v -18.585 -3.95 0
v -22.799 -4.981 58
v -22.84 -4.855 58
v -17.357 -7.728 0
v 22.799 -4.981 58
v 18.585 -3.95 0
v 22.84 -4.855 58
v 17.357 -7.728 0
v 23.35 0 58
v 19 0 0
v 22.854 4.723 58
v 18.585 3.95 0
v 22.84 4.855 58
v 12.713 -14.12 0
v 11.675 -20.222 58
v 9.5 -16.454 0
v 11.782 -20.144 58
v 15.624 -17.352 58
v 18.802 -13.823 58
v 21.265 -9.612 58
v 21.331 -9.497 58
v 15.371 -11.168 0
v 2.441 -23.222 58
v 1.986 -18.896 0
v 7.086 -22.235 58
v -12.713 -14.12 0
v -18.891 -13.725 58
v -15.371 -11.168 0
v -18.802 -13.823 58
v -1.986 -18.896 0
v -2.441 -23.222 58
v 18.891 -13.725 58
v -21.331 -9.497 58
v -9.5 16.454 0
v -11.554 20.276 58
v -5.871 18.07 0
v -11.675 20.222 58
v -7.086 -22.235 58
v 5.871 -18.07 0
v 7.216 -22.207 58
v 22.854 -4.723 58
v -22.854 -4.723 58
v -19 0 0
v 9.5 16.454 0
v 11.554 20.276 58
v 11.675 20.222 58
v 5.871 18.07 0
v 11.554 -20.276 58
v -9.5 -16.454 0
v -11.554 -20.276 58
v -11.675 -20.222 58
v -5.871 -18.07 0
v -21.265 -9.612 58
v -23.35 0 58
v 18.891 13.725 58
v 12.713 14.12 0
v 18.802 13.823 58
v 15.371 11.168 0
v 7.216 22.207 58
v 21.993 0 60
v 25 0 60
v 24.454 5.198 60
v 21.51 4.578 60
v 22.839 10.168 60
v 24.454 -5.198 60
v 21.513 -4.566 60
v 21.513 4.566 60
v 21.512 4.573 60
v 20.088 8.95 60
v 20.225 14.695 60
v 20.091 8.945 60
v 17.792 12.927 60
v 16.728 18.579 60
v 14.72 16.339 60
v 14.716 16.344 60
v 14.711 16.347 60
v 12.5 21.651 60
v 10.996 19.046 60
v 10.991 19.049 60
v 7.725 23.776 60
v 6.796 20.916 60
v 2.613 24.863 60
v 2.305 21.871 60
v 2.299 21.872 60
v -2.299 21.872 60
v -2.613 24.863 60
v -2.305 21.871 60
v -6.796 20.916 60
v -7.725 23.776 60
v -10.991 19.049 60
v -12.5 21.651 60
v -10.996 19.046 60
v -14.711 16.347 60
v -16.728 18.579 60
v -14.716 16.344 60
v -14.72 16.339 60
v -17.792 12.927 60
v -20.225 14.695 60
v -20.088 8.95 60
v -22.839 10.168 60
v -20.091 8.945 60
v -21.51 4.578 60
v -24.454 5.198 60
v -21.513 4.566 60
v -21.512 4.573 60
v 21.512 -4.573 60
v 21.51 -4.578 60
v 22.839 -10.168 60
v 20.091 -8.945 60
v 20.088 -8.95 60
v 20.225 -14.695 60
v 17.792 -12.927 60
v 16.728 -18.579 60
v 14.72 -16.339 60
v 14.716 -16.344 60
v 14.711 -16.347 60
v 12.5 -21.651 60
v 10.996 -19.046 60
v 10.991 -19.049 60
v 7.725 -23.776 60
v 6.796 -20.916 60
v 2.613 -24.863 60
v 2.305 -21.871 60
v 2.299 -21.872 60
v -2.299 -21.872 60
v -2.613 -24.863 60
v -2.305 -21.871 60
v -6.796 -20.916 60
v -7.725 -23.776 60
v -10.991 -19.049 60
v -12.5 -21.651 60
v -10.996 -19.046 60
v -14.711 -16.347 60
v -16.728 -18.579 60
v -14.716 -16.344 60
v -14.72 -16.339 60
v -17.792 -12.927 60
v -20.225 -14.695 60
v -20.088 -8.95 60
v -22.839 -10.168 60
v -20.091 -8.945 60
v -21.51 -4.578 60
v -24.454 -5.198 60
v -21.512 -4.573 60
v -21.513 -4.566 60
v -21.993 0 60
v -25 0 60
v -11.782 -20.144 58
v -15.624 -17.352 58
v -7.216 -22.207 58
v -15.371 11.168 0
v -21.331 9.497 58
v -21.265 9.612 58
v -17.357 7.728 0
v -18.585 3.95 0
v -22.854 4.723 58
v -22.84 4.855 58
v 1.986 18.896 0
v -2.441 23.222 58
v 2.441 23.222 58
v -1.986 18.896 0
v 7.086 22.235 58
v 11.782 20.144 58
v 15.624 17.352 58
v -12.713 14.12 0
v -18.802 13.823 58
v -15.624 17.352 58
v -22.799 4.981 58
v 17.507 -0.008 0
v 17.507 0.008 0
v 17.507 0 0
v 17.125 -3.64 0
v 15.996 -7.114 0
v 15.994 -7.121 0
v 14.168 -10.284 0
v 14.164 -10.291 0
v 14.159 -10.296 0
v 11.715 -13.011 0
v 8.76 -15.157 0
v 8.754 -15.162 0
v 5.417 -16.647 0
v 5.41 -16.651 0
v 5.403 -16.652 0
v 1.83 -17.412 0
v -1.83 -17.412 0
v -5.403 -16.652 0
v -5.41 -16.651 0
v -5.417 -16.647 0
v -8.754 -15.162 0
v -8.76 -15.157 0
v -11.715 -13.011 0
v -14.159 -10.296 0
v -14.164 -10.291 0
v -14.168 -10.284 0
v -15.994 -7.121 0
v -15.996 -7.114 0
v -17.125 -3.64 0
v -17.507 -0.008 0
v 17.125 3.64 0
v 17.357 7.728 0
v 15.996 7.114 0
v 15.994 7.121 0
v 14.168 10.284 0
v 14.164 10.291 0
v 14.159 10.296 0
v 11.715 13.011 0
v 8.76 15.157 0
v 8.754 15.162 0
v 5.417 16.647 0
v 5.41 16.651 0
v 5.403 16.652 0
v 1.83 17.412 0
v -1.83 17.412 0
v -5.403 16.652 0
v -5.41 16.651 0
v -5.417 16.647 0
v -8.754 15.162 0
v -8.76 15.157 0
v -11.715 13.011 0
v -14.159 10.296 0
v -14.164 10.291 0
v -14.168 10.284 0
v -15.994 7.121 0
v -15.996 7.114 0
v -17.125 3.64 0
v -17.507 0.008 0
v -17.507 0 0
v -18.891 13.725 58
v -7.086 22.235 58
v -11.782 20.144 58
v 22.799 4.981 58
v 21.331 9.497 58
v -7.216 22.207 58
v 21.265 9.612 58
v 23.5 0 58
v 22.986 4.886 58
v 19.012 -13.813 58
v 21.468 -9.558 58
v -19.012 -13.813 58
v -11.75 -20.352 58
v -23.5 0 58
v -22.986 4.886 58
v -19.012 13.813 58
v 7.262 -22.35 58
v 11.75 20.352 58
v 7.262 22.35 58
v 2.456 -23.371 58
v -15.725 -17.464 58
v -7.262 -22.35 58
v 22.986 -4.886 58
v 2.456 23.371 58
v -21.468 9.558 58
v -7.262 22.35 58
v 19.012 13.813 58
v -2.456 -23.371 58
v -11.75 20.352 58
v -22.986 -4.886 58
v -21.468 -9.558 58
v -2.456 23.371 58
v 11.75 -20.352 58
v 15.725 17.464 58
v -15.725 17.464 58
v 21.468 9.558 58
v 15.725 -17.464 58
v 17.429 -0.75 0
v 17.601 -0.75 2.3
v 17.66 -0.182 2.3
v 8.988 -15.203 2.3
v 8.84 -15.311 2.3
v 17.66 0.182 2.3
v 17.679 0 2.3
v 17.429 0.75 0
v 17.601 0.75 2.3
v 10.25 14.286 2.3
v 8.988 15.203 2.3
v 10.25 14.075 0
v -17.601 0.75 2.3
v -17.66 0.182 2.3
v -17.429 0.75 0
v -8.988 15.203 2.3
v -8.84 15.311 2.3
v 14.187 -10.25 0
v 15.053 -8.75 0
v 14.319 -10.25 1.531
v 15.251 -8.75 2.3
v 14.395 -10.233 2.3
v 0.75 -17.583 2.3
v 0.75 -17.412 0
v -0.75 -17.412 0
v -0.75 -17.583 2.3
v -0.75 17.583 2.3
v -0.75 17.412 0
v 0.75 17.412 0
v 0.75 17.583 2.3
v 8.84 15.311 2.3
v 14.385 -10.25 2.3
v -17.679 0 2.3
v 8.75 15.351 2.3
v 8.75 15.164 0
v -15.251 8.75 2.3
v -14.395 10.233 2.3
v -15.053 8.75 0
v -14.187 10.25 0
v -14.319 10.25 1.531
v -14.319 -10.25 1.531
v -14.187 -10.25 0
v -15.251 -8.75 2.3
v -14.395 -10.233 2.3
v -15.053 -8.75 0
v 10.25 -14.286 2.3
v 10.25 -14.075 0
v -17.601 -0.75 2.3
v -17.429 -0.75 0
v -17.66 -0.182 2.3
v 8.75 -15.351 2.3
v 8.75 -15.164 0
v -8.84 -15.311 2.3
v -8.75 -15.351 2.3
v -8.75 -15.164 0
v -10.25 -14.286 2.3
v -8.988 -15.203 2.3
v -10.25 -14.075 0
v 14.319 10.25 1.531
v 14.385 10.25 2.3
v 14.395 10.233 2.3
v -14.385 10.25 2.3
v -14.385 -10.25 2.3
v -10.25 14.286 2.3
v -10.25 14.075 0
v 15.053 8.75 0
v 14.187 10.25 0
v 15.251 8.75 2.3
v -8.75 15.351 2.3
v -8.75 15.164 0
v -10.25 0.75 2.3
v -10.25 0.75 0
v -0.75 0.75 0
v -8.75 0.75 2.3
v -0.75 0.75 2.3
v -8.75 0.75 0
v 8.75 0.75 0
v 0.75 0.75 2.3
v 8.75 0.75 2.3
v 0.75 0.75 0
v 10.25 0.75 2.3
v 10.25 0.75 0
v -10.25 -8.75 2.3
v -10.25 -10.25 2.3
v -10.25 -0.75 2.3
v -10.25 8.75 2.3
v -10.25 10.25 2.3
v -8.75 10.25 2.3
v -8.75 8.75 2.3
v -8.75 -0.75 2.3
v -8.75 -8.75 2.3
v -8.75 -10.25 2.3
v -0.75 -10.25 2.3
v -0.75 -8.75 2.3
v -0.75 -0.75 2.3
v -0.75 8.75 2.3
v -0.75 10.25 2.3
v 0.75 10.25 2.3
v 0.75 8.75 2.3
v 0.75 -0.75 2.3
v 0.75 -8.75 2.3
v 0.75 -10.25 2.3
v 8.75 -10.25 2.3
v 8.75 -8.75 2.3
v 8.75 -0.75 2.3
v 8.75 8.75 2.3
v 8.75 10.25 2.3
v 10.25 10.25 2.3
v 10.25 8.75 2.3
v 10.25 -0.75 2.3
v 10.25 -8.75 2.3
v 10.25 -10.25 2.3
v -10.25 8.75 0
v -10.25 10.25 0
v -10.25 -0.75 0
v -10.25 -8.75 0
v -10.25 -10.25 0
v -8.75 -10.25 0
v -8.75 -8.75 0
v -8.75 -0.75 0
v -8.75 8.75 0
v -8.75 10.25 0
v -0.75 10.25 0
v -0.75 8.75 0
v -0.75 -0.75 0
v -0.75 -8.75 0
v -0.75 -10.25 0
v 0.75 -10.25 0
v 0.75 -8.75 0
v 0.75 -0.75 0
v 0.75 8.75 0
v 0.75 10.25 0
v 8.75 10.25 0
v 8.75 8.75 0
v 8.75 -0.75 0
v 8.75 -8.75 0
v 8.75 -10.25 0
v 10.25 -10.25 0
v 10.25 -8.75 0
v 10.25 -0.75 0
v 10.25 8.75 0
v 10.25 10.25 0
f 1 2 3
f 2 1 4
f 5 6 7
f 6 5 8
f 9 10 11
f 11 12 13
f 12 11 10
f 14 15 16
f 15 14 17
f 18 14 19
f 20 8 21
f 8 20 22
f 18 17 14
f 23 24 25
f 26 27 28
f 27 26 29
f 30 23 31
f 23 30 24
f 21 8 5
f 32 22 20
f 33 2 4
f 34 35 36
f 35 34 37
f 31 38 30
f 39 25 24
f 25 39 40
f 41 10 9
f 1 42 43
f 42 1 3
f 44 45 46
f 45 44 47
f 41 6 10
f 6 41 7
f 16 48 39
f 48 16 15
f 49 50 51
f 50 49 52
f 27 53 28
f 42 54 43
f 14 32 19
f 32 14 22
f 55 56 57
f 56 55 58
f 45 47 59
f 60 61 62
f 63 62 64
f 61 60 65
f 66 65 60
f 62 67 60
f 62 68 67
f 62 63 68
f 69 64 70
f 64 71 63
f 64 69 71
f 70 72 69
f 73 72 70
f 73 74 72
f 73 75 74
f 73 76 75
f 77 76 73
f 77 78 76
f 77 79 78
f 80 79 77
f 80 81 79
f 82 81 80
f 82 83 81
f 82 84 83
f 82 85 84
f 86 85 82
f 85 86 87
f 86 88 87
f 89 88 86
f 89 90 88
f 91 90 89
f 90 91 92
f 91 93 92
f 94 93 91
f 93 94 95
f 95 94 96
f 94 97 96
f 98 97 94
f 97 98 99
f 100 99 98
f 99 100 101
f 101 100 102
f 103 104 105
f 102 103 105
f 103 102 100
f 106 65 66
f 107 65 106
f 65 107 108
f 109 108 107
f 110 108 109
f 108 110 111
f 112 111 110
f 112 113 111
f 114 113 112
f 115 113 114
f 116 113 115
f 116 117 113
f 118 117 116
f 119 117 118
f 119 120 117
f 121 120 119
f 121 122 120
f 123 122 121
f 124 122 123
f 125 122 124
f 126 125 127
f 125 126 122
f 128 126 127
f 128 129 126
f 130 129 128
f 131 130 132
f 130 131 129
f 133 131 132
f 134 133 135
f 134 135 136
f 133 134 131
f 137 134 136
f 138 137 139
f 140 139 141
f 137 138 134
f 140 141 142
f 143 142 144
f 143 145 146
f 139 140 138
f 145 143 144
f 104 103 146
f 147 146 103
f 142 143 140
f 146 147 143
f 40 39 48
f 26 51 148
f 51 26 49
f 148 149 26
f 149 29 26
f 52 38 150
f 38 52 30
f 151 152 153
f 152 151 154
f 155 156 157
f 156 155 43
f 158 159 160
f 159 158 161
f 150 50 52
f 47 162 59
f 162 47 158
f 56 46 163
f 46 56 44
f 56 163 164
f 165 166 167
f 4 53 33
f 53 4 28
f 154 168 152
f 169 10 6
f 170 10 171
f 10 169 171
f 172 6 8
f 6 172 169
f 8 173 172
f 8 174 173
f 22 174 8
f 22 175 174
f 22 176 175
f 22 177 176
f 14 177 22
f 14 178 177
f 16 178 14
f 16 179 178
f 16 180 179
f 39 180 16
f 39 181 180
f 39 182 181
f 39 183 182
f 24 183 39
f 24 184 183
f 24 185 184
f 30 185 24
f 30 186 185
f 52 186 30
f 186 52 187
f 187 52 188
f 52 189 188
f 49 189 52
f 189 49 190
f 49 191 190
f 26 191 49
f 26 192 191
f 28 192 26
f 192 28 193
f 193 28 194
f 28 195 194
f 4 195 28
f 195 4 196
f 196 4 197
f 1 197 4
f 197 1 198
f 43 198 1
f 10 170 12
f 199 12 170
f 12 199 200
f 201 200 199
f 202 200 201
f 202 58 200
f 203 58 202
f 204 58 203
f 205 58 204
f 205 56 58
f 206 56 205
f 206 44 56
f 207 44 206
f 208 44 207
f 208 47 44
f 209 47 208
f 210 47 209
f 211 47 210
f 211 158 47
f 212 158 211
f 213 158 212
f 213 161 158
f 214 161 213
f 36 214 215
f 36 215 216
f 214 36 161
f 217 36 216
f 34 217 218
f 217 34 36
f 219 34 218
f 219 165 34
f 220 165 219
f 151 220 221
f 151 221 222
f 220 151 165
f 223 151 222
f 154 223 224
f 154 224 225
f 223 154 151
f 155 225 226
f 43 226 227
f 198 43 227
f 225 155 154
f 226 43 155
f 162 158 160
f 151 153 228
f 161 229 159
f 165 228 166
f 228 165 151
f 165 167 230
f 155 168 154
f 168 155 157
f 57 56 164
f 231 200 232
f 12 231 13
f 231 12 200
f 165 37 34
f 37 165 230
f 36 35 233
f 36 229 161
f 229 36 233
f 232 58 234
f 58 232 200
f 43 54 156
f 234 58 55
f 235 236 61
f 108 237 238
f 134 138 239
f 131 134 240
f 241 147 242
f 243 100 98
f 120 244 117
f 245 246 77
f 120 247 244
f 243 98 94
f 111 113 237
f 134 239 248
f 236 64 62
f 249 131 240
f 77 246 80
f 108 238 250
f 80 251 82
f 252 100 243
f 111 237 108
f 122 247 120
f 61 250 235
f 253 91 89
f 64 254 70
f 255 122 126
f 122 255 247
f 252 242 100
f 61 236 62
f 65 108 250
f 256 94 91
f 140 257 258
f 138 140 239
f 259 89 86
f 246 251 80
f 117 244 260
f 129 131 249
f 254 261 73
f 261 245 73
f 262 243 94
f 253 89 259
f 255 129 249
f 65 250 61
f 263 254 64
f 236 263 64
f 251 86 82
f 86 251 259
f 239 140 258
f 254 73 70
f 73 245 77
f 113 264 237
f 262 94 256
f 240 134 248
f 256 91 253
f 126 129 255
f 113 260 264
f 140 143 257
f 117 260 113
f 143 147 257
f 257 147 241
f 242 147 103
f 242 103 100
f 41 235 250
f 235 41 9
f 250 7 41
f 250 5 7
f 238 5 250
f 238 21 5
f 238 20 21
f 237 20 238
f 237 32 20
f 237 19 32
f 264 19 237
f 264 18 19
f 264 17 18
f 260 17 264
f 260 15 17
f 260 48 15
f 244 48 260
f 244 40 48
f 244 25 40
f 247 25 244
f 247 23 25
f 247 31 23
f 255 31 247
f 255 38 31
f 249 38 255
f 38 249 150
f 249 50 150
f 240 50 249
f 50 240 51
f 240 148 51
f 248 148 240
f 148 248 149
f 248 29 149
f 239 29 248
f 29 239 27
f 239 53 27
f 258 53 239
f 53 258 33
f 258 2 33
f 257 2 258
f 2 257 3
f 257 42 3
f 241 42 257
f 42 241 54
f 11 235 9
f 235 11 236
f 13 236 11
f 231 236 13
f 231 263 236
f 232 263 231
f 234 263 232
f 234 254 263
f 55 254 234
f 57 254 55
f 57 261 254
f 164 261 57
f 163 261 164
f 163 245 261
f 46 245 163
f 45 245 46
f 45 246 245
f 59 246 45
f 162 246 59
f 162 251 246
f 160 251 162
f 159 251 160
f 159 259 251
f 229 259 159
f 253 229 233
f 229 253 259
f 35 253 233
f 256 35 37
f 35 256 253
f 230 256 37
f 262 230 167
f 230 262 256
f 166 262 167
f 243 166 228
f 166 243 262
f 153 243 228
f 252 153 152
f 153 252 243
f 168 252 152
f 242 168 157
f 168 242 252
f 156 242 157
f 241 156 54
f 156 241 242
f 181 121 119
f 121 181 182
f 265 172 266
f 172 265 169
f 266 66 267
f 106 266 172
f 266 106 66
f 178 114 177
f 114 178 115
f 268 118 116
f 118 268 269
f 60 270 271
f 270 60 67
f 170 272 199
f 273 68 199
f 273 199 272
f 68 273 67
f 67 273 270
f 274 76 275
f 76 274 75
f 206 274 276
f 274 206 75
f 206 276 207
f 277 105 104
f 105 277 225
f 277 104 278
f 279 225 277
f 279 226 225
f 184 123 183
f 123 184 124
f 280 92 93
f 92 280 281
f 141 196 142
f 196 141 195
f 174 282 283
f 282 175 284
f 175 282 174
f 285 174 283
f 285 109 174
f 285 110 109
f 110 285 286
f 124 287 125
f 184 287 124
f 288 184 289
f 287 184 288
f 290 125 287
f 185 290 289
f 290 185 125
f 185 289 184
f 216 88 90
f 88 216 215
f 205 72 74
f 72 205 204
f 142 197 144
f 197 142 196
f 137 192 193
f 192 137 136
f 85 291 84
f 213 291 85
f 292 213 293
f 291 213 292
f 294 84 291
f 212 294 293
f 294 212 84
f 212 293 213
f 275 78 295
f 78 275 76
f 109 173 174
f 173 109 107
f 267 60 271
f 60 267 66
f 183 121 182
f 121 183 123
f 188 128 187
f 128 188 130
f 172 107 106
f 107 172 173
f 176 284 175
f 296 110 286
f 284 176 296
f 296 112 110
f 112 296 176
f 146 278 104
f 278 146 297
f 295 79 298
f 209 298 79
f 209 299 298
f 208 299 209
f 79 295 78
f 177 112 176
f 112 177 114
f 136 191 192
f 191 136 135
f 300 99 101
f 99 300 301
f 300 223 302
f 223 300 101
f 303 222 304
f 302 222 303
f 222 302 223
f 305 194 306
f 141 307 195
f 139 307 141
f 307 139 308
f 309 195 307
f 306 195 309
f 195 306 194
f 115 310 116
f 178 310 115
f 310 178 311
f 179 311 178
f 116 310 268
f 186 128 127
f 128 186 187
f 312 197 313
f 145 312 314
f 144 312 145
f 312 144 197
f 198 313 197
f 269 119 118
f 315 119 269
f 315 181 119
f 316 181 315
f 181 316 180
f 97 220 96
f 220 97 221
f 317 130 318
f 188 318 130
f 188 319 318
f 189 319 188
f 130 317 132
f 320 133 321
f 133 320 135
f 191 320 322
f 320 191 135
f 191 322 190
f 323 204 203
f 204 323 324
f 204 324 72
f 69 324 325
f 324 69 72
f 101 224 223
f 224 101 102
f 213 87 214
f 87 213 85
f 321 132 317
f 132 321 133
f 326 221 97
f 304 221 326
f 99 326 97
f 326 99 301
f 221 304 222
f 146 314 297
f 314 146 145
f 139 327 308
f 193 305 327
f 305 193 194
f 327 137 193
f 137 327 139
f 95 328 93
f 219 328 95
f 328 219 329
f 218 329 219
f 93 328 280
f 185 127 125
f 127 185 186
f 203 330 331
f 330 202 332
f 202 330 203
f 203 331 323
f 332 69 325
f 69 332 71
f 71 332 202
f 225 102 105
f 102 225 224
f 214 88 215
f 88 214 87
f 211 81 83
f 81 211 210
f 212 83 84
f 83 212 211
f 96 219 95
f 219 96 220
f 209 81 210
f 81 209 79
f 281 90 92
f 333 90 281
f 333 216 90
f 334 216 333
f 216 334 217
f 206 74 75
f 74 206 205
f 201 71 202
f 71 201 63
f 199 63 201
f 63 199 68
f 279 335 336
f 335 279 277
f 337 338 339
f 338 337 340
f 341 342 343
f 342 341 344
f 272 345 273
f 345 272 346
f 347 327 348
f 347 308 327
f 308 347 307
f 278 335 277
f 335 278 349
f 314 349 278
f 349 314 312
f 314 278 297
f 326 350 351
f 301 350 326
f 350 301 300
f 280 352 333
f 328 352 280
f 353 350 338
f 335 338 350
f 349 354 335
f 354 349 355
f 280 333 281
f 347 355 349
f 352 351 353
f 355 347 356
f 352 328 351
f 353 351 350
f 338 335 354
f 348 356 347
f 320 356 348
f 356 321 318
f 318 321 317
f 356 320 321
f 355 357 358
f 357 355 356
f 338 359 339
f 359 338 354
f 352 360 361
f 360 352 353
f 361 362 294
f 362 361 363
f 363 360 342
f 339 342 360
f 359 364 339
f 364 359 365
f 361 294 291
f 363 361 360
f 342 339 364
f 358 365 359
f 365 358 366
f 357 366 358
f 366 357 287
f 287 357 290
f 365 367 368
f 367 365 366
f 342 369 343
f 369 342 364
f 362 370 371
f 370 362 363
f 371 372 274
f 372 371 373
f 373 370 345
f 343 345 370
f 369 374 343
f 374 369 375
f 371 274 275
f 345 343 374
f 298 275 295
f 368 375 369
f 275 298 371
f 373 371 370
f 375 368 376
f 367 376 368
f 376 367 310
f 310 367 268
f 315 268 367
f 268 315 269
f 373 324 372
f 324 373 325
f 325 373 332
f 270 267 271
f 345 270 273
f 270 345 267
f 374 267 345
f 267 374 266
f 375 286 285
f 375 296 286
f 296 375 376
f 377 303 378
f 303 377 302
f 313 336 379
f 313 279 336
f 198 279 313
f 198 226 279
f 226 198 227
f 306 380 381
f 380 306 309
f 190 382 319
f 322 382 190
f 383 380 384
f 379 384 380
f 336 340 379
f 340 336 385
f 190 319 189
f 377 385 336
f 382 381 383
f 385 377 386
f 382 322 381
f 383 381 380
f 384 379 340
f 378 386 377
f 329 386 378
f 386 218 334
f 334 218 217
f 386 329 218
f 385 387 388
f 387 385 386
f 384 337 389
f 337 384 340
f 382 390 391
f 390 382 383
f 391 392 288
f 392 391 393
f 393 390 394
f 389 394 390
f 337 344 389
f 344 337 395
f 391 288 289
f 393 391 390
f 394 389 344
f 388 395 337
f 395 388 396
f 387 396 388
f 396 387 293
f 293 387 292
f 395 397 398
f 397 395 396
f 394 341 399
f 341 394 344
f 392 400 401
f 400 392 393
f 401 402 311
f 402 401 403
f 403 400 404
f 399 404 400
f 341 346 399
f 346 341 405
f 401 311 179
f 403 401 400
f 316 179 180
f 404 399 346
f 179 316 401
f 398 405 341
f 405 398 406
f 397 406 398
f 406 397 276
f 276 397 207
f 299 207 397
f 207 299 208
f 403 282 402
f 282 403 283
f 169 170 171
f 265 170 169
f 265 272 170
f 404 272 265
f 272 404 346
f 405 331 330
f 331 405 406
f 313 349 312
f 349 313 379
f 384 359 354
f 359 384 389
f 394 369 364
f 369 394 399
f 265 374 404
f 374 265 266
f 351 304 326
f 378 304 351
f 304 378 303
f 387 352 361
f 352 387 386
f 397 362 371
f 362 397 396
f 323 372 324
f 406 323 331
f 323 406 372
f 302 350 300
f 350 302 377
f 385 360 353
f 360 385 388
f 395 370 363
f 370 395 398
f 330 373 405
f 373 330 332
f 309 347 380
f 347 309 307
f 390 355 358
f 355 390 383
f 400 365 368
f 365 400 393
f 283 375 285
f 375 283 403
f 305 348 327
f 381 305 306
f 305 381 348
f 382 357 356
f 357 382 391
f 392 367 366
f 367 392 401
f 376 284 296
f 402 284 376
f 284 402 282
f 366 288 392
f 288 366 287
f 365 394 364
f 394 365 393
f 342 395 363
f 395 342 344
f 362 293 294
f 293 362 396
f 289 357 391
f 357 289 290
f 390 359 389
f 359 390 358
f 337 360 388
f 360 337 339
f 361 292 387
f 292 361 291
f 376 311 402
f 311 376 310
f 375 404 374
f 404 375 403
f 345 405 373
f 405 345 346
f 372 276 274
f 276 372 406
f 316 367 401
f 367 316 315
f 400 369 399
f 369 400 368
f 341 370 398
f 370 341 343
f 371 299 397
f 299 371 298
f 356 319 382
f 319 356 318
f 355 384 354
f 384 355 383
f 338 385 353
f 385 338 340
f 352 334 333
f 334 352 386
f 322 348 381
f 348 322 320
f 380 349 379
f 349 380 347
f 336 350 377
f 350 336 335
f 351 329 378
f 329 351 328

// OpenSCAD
// Parametric hydroponic cup (C)2012 vik@diamondage.co.nz

cup_top_rad=47/2;
cup_wall=1.5;
cup_bottom_rad=38/2;
cup_height=60;
grid_ht=2.3;

difference () {
	union () {
		cylinder(h=cup_height,r1=cup_bottom_rad,r2=cup_top_rad);
		// Rim
		translate([0,0,cup_height-2]) cylinder(h=2,r2=cup_top_rad+cup_wall,r1=cup_top_rad);
	}
	translate([0,0,-0.1])
		cylinder(h=cup_height+0.2,r1=cup_bottom_rad-cup_wall,r2=cup_top_rad-cup_wall);
}

//grid for base.
translate([0,0,grid_ht/2]) intersection () {
	union () {
		cube([cup_wall,cup_bottom_rad*2,grid_ht],center=true);
		translate ([cup_bottom_rad*.5,0,0]) cube([cup_wall,cup_bottom_rad*2,grid_ht],center=true);
		translate ([cup_bottom_rad*-.5,0,0]) cube([cup_wall,cup_bottom_rad*2,grid_ht],center=true);
		
		rotate ([0,0,90]) {cube([cup_wall,cup_bottom_rad*2,grid_ht],center=true);
		translate ([cup_bottom_rad*.5,0,0]) cube([cup_wall,cup_bottom_rad*2,grid_ht],center=true);
		translate ([cup_bottom_rad*-.5,0,0]) cube([cup_wall,cup_bottom_rad*2,grid_ht],center=true);}
	}
	translate([0,0,-grid_ht]) cylinder(h=3*grid_ht,r=cup_bottom_rad-cup_wall/2);
}
